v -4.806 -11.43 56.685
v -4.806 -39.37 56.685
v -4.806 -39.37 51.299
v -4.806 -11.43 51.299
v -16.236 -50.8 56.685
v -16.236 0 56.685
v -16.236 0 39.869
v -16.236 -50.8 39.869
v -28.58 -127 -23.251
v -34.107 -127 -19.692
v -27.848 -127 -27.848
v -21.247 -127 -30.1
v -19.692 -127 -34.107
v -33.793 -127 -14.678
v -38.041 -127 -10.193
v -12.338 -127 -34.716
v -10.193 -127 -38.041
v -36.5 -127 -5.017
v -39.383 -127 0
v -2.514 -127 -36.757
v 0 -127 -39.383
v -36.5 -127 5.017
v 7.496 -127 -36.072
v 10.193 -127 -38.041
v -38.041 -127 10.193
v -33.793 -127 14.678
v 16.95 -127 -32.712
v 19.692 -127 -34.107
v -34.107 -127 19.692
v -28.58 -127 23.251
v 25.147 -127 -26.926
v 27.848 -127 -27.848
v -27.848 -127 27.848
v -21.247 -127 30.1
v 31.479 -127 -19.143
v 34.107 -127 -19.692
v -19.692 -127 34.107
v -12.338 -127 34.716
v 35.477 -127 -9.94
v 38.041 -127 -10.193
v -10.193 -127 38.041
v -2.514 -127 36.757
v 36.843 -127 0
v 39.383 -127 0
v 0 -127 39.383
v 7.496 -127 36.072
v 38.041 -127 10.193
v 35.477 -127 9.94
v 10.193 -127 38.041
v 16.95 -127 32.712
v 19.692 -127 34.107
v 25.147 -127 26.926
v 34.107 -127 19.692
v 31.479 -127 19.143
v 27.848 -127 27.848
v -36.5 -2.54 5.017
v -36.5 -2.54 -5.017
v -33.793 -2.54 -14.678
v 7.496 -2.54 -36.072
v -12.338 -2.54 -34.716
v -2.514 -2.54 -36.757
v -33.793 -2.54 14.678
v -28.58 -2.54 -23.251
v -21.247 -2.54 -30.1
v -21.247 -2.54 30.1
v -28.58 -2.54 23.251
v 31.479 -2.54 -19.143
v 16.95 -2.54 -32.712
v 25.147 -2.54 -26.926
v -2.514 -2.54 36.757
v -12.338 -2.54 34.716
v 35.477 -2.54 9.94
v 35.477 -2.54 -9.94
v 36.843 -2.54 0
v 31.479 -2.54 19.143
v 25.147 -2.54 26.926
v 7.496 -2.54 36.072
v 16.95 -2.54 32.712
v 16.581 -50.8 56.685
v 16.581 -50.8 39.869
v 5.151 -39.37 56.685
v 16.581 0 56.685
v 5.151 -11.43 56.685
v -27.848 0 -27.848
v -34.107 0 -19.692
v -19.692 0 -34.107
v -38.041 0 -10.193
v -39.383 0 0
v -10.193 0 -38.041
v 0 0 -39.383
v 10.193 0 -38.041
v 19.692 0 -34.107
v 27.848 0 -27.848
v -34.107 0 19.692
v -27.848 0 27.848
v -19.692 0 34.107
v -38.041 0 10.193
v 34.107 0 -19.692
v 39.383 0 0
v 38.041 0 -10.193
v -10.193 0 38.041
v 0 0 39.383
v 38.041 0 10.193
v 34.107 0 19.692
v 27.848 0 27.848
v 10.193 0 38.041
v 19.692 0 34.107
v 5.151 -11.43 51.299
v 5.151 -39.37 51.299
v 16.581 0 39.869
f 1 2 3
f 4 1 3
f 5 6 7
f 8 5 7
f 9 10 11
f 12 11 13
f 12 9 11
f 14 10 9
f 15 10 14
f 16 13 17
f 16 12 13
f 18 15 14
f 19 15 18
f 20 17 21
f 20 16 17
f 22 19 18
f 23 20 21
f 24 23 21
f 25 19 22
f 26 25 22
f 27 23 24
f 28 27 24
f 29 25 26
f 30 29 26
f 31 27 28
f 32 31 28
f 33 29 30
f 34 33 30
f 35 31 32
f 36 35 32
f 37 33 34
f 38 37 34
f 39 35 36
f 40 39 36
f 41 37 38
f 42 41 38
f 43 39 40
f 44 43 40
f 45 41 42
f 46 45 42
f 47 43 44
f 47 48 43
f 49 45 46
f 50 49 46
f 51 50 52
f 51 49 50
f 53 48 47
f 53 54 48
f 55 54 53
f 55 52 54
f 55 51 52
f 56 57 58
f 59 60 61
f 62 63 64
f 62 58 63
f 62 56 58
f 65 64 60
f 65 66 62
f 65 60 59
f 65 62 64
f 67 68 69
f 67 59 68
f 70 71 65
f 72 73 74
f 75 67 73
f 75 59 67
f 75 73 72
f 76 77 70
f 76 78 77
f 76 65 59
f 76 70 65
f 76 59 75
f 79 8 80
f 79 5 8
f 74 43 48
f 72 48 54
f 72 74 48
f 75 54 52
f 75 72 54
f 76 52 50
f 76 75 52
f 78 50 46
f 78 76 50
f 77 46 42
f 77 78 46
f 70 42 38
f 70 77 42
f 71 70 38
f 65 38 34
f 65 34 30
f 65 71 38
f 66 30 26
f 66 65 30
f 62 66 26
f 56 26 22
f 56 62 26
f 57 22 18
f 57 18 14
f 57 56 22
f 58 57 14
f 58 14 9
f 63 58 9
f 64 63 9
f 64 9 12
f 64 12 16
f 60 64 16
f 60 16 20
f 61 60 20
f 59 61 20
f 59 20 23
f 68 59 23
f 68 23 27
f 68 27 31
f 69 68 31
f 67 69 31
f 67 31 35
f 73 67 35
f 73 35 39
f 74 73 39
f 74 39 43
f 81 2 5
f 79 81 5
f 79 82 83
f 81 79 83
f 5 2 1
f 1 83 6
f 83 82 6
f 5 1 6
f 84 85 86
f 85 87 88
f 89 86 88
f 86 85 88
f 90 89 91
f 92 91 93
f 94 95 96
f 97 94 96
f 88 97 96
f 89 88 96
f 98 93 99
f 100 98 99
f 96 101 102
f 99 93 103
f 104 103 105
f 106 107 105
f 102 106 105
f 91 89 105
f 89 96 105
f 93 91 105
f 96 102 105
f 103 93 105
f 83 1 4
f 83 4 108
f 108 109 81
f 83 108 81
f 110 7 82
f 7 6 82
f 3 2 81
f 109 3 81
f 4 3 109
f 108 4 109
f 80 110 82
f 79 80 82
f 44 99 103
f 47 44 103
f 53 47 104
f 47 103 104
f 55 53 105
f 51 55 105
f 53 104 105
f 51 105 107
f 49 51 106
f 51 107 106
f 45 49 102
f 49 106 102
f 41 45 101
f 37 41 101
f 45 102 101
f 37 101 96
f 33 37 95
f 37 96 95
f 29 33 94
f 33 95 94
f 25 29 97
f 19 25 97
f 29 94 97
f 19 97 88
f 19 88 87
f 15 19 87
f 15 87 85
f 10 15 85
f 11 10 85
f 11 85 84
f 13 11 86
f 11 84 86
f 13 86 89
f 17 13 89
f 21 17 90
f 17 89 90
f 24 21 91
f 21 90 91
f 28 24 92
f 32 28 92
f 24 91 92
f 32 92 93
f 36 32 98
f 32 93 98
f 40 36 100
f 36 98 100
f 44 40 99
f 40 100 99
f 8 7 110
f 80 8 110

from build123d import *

# Parameters (mm, degrees)
F0_R     = 39.383021
F1_DEPTH = 127
F2_T     = -2.54
F4_DEPTH = 50.8
F5_T     = -11.43


with BuildPart() as f1:
    # F0 (on Front) → F1 (new body)
    with BuildSketch(Plane.XZ):
        Circle(F0_R)
    extrude(amount=F1_DEPTH)

    # F2
    f2_openings = [f1.faces().sort_by_distance(p)[0] for p in [
        (0, -127, 0),
    ]]
    offset(amount=F2_T, openings=f2_openings)


with BuildPart() as f4:
    # F3 (on Front) → F4 (new body)
    with BuildSketch(Plane.XZ):
        Polygon((-16.236335, 39.86939), (0, 39.86939), (16.581327, 39.86939), (16.581327, 56.685053), (-16.236335, 56.685053), align=None)
    extrude(amount=F4_DEPTH)

    # F5
    f5_openings = [f4.faces().sort_by_distance(p)[0] for p in [
        (0.172496, -25.4, 56.685053),
    ]]
    offset(amount=F5_T, openings=f5_openings)


solid = Compound([f1.part, f4.part])
